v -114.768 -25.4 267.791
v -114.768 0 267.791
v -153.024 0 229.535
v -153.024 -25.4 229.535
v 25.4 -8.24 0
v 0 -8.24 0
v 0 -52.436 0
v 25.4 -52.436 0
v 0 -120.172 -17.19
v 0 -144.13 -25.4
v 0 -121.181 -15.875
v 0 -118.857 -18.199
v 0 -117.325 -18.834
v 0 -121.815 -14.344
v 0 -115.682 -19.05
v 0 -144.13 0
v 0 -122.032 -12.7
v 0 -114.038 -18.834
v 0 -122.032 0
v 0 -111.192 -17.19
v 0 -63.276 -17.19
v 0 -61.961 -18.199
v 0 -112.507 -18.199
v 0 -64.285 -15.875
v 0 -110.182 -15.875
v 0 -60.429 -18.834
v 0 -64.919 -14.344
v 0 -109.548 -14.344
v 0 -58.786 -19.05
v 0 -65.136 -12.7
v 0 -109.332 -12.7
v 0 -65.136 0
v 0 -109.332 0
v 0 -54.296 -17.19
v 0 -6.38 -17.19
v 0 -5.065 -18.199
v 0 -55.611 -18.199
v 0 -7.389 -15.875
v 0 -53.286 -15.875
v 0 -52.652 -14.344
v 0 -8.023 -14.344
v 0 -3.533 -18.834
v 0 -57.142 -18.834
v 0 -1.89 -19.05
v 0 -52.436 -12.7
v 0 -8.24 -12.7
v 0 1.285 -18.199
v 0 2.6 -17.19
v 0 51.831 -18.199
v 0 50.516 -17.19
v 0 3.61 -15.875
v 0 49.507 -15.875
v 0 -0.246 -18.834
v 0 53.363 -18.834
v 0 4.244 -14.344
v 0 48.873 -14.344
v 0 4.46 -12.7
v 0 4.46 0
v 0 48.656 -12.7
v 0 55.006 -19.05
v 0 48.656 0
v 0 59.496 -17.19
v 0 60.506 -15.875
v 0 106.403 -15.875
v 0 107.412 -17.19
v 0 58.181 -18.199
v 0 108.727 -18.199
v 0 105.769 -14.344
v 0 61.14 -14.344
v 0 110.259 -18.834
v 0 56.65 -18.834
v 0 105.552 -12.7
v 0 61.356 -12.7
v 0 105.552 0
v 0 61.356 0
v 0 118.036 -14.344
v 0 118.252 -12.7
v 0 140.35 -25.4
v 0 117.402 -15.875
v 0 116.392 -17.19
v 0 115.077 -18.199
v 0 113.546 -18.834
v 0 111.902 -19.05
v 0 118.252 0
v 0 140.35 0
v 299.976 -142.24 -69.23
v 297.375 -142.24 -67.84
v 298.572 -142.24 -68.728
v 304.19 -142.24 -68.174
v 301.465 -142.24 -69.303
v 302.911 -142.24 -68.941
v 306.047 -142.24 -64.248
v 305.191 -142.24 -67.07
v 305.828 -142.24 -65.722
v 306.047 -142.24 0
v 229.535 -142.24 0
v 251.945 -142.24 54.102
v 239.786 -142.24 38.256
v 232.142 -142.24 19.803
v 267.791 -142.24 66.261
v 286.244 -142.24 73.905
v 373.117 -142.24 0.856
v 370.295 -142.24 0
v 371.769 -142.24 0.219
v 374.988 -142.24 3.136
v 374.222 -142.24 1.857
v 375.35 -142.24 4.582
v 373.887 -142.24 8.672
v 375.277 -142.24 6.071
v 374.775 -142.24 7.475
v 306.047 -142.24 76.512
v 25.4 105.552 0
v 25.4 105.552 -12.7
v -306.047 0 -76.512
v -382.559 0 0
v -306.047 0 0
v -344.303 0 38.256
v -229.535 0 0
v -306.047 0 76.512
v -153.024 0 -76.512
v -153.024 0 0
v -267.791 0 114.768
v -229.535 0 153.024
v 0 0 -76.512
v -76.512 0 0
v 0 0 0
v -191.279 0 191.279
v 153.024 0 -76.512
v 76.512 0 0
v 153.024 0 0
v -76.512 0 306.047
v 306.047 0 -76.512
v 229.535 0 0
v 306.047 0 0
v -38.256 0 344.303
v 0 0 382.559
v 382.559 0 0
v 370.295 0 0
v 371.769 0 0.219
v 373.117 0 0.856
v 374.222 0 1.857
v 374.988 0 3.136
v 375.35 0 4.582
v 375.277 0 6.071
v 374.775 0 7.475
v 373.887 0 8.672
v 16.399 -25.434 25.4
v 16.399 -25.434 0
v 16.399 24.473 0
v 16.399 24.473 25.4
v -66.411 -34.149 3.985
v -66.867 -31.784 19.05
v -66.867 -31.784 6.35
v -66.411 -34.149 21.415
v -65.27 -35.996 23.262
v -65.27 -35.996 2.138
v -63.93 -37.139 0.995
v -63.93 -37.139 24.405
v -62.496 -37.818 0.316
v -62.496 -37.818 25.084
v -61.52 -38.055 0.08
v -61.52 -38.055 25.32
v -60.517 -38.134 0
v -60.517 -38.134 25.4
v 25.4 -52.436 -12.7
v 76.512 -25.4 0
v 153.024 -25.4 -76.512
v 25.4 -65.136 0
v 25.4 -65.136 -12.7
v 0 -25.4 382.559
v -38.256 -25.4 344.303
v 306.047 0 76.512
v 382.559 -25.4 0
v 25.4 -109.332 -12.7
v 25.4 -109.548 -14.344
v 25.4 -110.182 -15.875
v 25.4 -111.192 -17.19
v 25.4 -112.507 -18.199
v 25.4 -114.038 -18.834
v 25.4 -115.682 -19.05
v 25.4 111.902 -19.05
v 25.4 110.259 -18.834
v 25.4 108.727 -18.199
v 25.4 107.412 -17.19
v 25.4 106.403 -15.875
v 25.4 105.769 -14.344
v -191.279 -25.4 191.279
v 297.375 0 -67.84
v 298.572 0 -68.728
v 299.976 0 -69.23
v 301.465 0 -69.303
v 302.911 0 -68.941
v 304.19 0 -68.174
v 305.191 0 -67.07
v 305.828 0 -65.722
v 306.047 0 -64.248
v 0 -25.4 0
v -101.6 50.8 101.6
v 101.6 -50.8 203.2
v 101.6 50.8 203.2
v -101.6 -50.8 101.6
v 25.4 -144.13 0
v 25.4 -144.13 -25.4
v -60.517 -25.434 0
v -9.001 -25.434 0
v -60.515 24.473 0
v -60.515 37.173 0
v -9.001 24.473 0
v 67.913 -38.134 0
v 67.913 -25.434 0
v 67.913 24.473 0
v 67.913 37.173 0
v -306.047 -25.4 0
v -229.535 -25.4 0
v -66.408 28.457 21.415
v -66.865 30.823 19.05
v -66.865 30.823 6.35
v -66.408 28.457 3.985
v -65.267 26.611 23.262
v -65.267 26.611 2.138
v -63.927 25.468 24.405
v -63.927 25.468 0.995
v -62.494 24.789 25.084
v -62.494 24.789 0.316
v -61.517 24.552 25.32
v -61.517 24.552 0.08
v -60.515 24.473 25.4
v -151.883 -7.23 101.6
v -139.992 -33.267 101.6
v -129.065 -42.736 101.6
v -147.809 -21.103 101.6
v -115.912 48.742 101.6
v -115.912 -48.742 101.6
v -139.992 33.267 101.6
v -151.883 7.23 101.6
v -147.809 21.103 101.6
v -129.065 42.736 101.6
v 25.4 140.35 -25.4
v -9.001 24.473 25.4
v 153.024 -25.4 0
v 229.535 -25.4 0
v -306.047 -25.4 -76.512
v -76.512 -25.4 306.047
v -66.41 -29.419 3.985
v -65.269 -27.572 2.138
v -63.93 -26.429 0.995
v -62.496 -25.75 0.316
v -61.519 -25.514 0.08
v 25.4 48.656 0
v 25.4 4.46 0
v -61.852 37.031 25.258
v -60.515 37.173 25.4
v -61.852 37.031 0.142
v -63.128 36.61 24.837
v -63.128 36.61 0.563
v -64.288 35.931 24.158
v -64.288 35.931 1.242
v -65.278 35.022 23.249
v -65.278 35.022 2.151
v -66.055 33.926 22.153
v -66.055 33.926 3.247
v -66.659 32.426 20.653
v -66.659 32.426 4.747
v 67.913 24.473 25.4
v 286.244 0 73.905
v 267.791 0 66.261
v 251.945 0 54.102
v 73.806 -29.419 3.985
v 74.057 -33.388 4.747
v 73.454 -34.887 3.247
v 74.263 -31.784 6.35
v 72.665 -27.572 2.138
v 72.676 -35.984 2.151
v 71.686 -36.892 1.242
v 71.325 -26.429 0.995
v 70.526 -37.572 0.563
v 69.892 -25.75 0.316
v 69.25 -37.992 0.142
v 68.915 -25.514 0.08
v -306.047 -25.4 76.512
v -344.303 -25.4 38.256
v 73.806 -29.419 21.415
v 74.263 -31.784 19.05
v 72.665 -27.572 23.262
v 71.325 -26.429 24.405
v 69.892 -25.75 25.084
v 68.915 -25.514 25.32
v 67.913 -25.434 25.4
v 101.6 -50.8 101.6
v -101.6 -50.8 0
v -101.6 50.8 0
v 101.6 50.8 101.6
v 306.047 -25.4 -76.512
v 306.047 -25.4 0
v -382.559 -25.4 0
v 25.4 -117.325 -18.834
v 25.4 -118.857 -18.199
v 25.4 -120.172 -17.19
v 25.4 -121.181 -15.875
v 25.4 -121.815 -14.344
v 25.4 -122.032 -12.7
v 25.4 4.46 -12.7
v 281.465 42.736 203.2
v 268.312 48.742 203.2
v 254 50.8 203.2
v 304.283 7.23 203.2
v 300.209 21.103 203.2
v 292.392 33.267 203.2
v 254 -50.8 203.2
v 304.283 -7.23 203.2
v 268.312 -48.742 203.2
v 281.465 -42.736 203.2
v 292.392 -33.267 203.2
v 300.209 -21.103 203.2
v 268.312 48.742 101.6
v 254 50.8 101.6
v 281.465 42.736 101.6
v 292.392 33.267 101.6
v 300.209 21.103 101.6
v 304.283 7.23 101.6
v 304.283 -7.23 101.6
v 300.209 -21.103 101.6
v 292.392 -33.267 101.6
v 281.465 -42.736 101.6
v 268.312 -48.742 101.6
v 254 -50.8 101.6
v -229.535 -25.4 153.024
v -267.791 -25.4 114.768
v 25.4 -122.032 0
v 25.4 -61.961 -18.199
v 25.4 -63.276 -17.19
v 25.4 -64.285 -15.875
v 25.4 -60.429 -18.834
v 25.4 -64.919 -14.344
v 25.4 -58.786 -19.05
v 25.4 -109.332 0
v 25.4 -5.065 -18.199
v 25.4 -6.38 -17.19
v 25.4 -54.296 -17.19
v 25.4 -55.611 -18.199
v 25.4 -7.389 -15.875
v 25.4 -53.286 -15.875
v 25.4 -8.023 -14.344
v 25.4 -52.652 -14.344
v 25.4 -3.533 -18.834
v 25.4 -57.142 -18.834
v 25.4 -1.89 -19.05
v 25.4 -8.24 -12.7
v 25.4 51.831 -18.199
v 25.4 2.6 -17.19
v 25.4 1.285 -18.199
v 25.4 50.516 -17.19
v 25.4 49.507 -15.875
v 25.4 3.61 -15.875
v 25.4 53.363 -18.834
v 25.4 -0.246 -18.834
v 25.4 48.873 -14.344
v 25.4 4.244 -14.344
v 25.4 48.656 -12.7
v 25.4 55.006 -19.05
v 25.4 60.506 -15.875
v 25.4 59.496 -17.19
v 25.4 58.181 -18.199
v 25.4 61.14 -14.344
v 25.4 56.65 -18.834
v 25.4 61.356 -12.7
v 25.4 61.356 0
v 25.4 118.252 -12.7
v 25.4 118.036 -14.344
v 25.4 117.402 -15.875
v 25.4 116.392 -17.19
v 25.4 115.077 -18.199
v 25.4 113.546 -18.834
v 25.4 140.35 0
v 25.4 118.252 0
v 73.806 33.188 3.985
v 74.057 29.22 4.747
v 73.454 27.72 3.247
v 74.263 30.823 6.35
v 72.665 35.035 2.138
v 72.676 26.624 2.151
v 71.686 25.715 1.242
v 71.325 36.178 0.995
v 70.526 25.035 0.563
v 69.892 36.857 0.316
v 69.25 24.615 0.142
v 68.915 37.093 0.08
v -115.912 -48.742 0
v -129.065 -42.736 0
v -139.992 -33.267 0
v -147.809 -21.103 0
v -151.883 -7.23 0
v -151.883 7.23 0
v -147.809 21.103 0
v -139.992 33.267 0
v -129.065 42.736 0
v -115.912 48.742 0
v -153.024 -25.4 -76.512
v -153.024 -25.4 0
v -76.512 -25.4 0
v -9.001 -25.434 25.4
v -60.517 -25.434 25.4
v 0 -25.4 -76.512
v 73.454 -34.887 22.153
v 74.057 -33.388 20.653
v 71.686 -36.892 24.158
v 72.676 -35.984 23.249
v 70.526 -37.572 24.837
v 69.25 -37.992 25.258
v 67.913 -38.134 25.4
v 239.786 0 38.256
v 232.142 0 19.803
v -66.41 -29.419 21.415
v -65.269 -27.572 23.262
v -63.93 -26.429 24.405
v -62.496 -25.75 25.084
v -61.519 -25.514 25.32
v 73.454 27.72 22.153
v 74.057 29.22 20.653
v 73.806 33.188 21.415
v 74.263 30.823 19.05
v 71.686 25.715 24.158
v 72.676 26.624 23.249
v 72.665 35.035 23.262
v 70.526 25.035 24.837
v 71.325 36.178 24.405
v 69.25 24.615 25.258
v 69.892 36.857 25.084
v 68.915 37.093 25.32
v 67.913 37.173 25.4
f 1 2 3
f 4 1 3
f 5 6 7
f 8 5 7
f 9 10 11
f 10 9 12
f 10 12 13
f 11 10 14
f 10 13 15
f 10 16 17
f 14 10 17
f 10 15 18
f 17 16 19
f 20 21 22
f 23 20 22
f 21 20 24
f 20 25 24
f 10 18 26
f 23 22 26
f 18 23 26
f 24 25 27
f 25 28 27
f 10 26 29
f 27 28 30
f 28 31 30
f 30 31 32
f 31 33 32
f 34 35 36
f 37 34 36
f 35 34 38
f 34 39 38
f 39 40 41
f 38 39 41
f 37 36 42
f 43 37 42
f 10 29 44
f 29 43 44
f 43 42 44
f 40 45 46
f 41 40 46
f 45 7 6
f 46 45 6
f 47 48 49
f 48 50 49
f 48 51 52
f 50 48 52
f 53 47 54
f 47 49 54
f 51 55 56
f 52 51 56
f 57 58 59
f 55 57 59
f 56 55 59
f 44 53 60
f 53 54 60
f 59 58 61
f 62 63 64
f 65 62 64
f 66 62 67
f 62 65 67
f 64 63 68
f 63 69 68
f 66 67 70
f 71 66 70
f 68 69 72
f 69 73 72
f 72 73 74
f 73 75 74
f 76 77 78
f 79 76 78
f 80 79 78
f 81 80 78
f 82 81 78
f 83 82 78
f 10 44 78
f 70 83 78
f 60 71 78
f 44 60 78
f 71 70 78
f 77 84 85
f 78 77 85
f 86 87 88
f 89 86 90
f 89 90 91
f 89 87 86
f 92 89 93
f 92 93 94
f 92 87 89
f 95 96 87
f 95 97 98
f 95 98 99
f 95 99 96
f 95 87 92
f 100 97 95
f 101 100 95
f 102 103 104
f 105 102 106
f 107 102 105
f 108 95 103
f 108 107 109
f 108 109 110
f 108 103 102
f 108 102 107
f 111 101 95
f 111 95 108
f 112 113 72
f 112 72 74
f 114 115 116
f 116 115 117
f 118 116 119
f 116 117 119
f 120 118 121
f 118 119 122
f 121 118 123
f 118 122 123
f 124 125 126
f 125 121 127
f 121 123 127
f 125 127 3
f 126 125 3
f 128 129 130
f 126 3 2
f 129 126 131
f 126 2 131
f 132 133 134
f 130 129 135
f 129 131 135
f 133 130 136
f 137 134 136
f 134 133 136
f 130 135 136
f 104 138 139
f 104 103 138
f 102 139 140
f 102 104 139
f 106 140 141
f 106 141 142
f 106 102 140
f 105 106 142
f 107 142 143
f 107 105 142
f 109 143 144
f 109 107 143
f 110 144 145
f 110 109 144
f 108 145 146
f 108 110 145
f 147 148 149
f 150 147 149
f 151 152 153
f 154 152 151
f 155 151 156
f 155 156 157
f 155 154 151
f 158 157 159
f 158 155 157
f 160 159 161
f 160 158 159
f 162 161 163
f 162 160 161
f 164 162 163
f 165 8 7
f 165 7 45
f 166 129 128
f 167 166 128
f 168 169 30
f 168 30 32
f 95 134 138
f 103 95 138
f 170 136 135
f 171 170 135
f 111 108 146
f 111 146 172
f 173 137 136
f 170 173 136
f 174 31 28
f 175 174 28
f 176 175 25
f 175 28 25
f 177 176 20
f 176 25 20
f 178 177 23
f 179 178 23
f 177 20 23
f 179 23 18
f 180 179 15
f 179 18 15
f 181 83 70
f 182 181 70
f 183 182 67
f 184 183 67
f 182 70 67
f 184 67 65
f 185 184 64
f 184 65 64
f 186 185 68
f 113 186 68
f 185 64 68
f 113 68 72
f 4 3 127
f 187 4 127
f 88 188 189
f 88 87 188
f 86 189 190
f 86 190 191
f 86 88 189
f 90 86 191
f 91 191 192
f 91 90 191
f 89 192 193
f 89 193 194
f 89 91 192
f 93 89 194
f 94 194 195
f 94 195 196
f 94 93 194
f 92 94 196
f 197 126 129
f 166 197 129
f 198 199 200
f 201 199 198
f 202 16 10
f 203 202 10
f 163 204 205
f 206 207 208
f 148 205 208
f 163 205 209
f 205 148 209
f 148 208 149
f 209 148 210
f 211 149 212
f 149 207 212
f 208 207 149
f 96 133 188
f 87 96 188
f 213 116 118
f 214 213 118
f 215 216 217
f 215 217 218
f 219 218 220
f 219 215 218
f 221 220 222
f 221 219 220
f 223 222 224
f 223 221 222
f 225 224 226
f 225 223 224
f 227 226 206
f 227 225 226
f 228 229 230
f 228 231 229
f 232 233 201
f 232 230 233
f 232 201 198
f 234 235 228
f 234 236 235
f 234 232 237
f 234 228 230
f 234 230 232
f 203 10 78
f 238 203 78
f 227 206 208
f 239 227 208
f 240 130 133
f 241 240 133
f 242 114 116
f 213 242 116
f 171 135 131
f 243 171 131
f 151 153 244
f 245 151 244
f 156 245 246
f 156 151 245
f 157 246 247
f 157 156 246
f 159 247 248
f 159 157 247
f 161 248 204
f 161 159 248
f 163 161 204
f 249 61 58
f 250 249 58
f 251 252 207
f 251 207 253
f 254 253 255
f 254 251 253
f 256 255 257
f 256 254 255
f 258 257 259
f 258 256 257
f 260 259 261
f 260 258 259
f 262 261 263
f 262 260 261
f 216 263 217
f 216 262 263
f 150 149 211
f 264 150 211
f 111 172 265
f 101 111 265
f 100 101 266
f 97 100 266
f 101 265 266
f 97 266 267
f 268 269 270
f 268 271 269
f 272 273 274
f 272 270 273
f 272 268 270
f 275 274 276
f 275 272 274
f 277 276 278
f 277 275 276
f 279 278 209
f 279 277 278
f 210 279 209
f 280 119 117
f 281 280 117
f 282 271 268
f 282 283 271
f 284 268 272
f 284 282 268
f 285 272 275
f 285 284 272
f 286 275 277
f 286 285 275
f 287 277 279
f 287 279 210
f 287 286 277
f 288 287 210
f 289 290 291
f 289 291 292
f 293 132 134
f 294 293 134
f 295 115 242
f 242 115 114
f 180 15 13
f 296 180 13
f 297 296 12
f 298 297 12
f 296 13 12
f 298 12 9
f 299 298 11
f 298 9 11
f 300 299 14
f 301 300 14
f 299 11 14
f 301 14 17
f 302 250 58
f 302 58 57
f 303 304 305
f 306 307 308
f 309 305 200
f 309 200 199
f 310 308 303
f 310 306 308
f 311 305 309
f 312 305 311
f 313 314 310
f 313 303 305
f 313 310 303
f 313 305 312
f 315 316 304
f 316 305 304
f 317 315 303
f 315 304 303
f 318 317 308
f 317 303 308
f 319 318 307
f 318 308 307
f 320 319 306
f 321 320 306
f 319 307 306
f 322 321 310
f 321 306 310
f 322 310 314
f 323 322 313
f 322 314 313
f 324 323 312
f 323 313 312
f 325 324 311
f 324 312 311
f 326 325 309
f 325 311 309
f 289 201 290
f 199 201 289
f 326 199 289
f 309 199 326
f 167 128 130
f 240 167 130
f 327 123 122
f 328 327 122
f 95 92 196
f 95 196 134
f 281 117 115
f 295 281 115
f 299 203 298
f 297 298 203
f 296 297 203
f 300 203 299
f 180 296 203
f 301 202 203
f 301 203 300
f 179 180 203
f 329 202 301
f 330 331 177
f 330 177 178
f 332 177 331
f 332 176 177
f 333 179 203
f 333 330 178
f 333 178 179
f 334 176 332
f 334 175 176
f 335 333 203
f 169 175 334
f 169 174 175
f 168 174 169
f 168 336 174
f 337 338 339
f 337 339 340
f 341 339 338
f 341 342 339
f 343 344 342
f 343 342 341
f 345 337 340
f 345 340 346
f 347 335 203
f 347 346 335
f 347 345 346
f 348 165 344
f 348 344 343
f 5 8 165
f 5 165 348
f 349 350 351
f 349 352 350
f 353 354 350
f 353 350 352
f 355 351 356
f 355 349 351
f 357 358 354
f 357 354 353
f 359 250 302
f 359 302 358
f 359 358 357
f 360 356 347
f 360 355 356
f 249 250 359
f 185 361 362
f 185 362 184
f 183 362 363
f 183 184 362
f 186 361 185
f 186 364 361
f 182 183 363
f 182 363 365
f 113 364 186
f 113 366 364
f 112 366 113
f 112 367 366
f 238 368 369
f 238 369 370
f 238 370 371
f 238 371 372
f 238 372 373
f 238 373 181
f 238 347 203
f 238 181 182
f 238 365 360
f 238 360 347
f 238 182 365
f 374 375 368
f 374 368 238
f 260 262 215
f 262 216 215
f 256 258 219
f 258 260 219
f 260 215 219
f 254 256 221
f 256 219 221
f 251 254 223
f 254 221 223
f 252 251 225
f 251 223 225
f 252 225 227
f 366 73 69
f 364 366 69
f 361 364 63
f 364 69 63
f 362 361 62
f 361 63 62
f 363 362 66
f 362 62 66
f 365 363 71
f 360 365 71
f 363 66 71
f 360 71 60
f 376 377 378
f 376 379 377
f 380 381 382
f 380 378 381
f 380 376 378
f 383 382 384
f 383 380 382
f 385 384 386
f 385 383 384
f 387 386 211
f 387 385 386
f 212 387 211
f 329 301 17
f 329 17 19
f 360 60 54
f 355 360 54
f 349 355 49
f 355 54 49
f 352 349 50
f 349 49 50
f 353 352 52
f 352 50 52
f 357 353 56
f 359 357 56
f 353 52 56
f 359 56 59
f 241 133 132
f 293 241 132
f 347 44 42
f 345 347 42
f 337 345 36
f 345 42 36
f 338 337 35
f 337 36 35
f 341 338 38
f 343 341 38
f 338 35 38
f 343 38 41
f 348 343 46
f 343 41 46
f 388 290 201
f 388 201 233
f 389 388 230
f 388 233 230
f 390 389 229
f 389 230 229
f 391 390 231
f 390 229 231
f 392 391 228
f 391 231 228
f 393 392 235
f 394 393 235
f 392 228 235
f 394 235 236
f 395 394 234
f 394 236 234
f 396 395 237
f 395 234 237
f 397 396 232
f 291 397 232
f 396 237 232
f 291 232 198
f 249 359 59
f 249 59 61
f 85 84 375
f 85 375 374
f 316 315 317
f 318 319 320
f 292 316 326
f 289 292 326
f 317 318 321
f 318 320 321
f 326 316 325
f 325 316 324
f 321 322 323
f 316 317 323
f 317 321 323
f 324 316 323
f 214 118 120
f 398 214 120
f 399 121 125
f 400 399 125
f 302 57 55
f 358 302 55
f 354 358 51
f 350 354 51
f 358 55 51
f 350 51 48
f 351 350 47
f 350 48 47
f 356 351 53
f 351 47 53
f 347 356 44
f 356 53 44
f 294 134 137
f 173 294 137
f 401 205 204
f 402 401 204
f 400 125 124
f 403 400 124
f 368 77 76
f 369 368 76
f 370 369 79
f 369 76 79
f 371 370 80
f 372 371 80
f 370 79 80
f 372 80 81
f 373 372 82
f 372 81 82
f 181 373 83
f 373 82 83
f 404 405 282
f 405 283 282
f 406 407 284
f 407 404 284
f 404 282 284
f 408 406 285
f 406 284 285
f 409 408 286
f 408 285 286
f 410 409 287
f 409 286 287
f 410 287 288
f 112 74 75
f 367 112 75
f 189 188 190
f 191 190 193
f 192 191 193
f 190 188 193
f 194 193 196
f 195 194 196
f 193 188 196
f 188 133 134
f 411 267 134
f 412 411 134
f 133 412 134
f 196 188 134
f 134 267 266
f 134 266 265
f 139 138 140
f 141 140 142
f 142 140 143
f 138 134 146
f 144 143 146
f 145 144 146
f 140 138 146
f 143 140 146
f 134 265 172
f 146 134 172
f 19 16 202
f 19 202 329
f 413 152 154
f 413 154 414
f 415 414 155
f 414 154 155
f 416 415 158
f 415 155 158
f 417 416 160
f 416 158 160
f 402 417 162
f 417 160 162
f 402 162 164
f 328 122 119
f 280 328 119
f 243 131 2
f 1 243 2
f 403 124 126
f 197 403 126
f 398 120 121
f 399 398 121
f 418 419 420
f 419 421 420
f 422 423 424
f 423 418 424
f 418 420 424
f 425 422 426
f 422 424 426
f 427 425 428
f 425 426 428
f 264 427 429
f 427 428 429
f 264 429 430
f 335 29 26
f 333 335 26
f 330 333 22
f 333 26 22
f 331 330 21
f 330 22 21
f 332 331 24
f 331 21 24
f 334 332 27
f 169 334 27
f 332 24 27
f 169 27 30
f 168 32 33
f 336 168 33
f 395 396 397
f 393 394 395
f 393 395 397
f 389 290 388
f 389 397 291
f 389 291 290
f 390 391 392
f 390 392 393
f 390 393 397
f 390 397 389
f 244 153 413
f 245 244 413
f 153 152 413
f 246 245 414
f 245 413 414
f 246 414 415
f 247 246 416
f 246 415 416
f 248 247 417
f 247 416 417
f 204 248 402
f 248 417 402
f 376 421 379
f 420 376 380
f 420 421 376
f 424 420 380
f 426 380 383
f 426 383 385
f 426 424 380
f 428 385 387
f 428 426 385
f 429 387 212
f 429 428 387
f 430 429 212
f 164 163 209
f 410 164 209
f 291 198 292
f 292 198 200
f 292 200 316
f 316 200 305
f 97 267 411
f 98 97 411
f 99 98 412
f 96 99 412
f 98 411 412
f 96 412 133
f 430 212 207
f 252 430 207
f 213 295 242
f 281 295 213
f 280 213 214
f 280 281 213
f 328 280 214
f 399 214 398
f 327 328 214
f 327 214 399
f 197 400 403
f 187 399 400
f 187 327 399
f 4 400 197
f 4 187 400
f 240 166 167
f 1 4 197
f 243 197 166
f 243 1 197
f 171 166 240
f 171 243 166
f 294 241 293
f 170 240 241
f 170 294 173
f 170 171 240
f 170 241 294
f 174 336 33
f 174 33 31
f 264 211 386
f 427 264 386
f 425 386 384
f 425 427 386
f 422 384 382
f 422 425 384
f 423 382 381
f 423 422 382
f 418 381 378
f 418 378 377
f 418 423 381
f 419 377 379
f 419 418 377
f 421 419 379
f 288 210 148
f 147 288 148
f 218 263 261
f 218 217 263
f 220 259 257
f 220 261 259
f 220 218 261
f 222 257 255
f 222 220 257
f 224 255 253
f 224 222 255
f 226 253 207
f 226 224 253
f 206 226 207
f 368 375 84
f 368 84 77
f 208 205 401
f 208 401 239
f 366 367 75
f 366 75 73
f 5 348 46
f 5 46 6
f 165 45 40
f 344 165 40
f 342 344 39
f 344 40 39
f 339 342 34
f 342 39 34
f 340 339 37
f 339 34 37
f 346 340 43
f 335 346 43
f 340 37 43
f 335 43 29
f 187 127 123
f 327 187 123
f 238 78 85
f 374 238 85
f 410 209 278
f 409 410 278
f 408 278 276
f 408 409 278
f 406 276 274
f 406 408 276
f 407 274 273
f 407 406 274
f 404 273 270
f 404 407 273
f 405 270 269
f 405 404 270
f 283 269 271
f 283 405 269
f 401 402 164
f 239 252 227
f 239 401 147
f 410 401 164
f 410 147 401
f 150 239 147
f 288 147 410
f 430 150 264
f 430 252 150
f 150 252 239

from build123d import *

# Parameters (mm, degrees)
F0_W          = 101.6
F0_H          = 50.8
F0_W_2        = 50.8
F0_H_2        = 101.6
F1_DEPTH      = 50.8
F2_ANGLE_BACK = 90
F2_ANGLE      = 180
F3_DEPTH      = 2.286
F0_W_3        = 43.6525400519
F4_ANGLE_BACK = 90
F4_ANGLE      = 180
F5_W          = 22.098
F5_H          = 6.35
F6_DEPTH      = 25.4
F7_W          = 57.8641055384
F7_H          = 12.7
F7_W_2        = 12.7
F7_H_2        = 49.9071290871
F8_DEPTH      = 25.4
F9_R          = 6.34999
F11_DEPTH     = 25.4
F12_DEPTH     = 142.24
F13_R         = 5.08


# Not quite as in the source:
# - a fillet or chamfer is up to 0.001 mm smaller than in the source, because OpenCascade refuses the exact size


with BuildPart() as f1:
    # F0 (on Front) → F1 (new body, symmetric)
    with BuildSketch(Plane.XZ):
        Polygon((101.6, 203.2), (0, 152.4), (101.6, 152.4), align=None)
        with Locations((50.8, 127)):
            Rectangle(F0_W, F0_H)
        Polygon((0, 152.4), (-101.6, 101.6), (0, 101.6), align=None)
        with Locations((-50.8, 76.2)):
            Rectangle(F0_W, F0_H)
        Polygon((0, 101.6), (0, 50.8), (101.6, 101.6), align=None)
        Polygon((-101.6, 50.8), (-101.6, 0), (0, 50.8), align=None)
        Polygon((101.6, 152.4), (101.6, 101.6), (152.4, 101.6), (152.4, 203.2), (101.6, 203.2), align=None)
        with Locations((177.8, 152.4)):
            Rectangle(F0_W_2, F0_H_2)
        with Locations((228.6, 152.4)):
            Rectangle(F0_W_2, F0_H_2)
    extrude(amount=F1_DEPTH, both=True)

    # F0 (on Front) → F2 (revolve)
    with BuildSketch(Plane.XZ, mode=Mode.PRIVATE) as f2_sk:
        with Locations((279.4, 152.4)):
            Rectangle(F0_W_2, F0_H_2)
    revolve(f2_sk.sketch.rotate(Axis((254, 0, 152.4), (0, 0, -1)), -F2_ANGLE_BACK), axis=Axis((254, 0, 152.4), (0, 0, -1)), revolution_arc=F2_ANGLE)

    # F0 (on Front) → F4 (revolve)
    with BuildSketch(Plane.XZ, mode=Mode.PRIVATE) as f4_sk:
        with Locations((-130.573729974, 50.8)):
            Rectangle(F0_W_3, F0_H_2)
        Polygon((-108.7474599481, 0), (-101.6, 0), (-101.6, 50.8), (-101.6, 101.6), (-108.7474599481, 101.6), align=None)
    revolve(f4_sk.sketch.rotate(Axis((-101.6, 0, 50.8), (0, 0, -1)), -F4_ANGLE_BACK), axis=Axis((-101.6, 0, 50.8), (0, 0, -1)), revolution_arc=F4_ANGLE)


with BuildPart() as f3:
    # F0 (on Front) → F3 (new body)
    with BuildSketch(Plane.XZ):
        Polygon((-108.7474599481, 0), (-101.6, 0), (-101.6, 50.8), (-101.6, 101.6), (-108.7474599481, 101.6), align=None)
    extrude(amount=F3_DEPTH)

    # F10 (on Front) → F11 (join)
    with BuildSketch(Plane.XZ):
        Polygon((-344.3030196818, 38.2558910758), (-382.5589107575, 0), (-306.047128606, 0), align=None)
        Polygon((-306.047128606, 0), (-382.5589107575, 0), (-306.047128606, -76.5117821515), align=None)
        Polygon((-344.3030196818, 38.2558910758), (-306.047128606, 0), (-229.5353464545, 0), (-306.047128606, 76.5117821515), align=None)
        with BuildLine():
            ThreePointArc((-229.5353464545, 0), (-251.945128606, 54.102), (-306.047128606, 76.5117821515))
            Line((-306.047128606, 76.5117821515), (-229.5353464545, 0))
        make_face()
        with BuildLine():
            Line((-267.7912375303, 114.7676732273), (-306.047128606, 76.5117821515))
            ThreePointArc((-306.047128606, 76.5117821515), (-251.945128606, 54.102), (-229.5353464545, 0))
            ThreePointArc((-229.5353464545, 0), (-223.7112338288, 29.2797914101), (-207.125564303, 54.102))
            Line((-207.125564303, 54.102), (-267.7912375303, 114.7676732273))
        make_face()
        with BuildLine():
            ThreePointArc((-207.125564303, 54.102), (-223.7112338288, 29.2797914101), (-229.5353464545, 0))
            Line((-229.5353464545, 0), (-153.023564303, 0))
            Line((-153.023564303, 0), (-207.125564303, 54.102))
        make_face()
        Polygon((-153.023564303, 0), (-229.5353464545, 0), (-153.023564303, -76.5117821515), align=None)
        with BuildLine():
            Line((-229.5353464545, 153.023564303), (-267.7912375303, 114.7676732273))
            Line((-267.7912375303, 114.7676732273), (-207.125564303, 54.102))
            ThreePointArc((-207.125564303, 54.102), (-182.3033557131, 70.6876695257), (-153.023564303, 76.5117821515))
            Line((-153.023564303, 76.5117821515), (-229.5353464545, 153.023564303))
        make_face()
        with BuildLine():
            Line((-207.125564303, 54.102), (-153.023564303, 0))
            Line((-153.023564303, 0), (-76.5117821515, 0))
            Line((-76.5117821515, 0), (-153.023564303, 76.5117821515))
            ThreePointArc((-153.023564303, 76.5117821515), (-182.3033557131, 70.6876695257), (-207.125564303, 54.102))
        make_face()
        with BuildLine():
            Line((-191.2794553788, 191.2794553788), (-229.5353464545, 153.023564303))
            Line((-229.5353464545, 153.023564303), (-153.023564303, 76.5117821515))
            ThreePointArc((-153.023564303, 76.5117821515), (-98.921564303, 54.102), (-76.5117821515, 0))
            ThreePointArc((-76.5117821515, 0), (-70.6876695257, 29.2797914101), (-54.102, 54.102))
            Line((-54.102, 54.102), (-191.2794553788, 191.2794553788))
        make_face()
        Polygon((-38.2558910758, 38.2558910758), (-76.5117821515, 0), (0, 0), align=None)
        Polygon((0, 0), (-76.5117821515, 0), (0, -76.5117821515), align=None)
        with BuildLine():
            ThreePointArc((-54.102, 54.102), (-70.6876695257, 29.2797914101), (-76.5117821515, 0))
            Line((-76.5117821515, 0), (-38.2558910758, 38.2558910758))
            Line((-38.2558910758, 38.2558910758), (-54.102, 54.102))
        make_face()
        with BuildLine():
            Line((-153.023564303, 76.5117821515), (-76.5117821515, 0))
            ThreePointArc((-76.5117821515, 0), (-98.921564303, 54.102), (-153.023564303, 76.5117821515))
        make_face()
        with BuildLine():
            Line((-153.023564303, 229.5353464545), (-191.2794553788, 191.2794553788))
            Line((-191.2794553788, 191.2794553788), (-54.102, 54.102))
            ThreePointArc((-54.102, 54.102), (-29.2797914101, 70.6876695257), (0, 76.5117821515))
            Line((0, 76.5117821515), (-153.023564303, 229.5353464545))
        make_face()
        Polygon((-38.2558910758, 38.2558910758), (0, 0), (76.5117821515, 0), (0, 76.5117821515), align=None)
        with BuildLine():
            Line((-54.102, 54.102), (-38.2558910758, 38.2558910758))
            Line((-38.2558910758, 38.2558910758), (0, 76.5117821515))
            ThreePointArc((0, 76.5117821515), (-29.2797914101, 70.6876695257), (-54.102, 54.102))
        make_face()
        Polygon((-114.7676732273, 267.7912375303), (-153.023564303, 229.5353464545), (0, 76.5117821515), (38.2558910758, 114.7676732273), align=None)
        Polygon((114.7676732273, 38.2558910758), (76.5117821515, 0), (153.023564303, 0), align=None)
        Polygon((153.023564303, 0), (76.5117821515, 0), (153.023564303, -76.5117821515), align=None)
        with BuildLine():
            ThreePointArc((98.921564303, 54.102), (82.3358947773, 29.2797914101), (76.5117821515, 0))
            Line((76.5117821515, 0), (114.7676732273, 38.2558910758))
            Line((114.7676732273, 38.2558910758), (98.921564303, 54.102))
        make_face()
        with BuildLine():
            ThreePointArc((0, 76.5117821515), (54.102, 54.102), (76.5117821515, 0))
            ThreePointArc((76.5117821515, 0), (82.3358947773, 29.2797914101), (98.921564303, 54.102))
            Line((98.921564303, 54.102), (38.2558910758, 114.7676732273))
            Line((38.2558910758, 114.7676732273), (0, 76.5117821515))
        make_face()
        with BuildLine():
            Line((0, 76.5117821515), (76.5117821515, 0))
            ThreePointArc((76.5117821515, 0), (54.102, 54.102), (0, 76.5117821515))
        make_face()
        Polygon((-76.5117821515, 306.047128606), (-114.7676732273, 267.7912375303), (38.2558910758, 114.7676732273), (76.5117821515, 153.023564303), align=None)
        Polygon((114.7676732273, 38.2558910758), (153.023564303, 0), (229.5353464545, 0), (153.023564303, 76.5117821515), align=None)
        with BuildLine():
            Line((98.921564303, 54.102), (114.7676732273, 38.2558910758))
            Line((114.7676732273, 38.2558910758), (153.023564303, 76.5117821515))
            ThreePointArc((153.023564303, 76.5117821515), (123.7437728929, 70.6876695257), (98.921564303, 54.102))
        make_face()
        with BuildLine():
            Line((38.2558910758, 114.7676732273), (98.921564303, 54.102))
            ThreePointArc((98.921564303, 54.102), (123.7437728929, 70.6876695257), (153.023564303, 76.5117821515))
            Line((153.023564303, 76.5117821515), (76.5117821515, 153.023564303))
            Line((76.5117821515, 153.023564303), (38.2558910758, 114.7676732273))
        make_face()
        Polygon((-38.2558910758, 344.3030196818), (-76.5117821515, 306.047128606), (76.5117821515, 153.023564303), (114.7676732273, 191.2794553788), align=None)
        with BuildLine():
            ThreePointArc((251.945128606, 54.102), (235.3594590803, 29.2797914101), (229.5353464545, 0))
            Line((229.5353464545, 0), (306.047128606, 0))
            Line((306.047128606, 0), (251.945128606, 54.102))
        make_face()
        Polygon((306.047128606, 0), (229.5353464545, 0), (306.047128606, -76.5117821515), align=None)
        with BuildLine():
            ThreePointArc((153.023564303, 76.5117821515), (207.125564303, 54.102), (229.5353464545, 0))
            ThreePointArc((229.5353464545, 0), (235.3594590803, 29.2797914101), (251.945128606, 54.102))
            Line((251.945128606, 54.102), (191.2794553788, 114.7676732273))
            Line((191.2794553788, 114.7676732273), (153.023564303, 76.5117821515))
        make_face()
        with BuildLine():
            Line((153.023564303, 76.5117821515), (229.5353464545, 0))
            ThreePointArc((229.5353464545, 0), (207.125564303, 54.102), (153.023564303, 76.5117821515))
        make_face()
        Polygon((153.023564303, 153.023564303), (153.023564303, 76.5117821515), (191.2794553788, 114.7676732273), align=None)
        Polygon((76.5117821515, 153.023564303), (153.023564303, 76.5117821515), (153.023564303, 153.023564303), align=None)
        Polygon((114.7676732273, 191.2794553788), (76.5117821515, 153.023564303), (153.023564303, 153.023564303), align=None)
        Polygon((0, 382.5589107575), (-38.2558910758, 344.3030196818), (114.7676732273, 191.2794553788), (153.023564303, 229.5353464545), align=None)
        with BuildLine():
            Line((251.945128606, 54.102), (306.047128606, 0))
            Line((306.047128606, 0), (382.5589107575, 0))
            Line((382.5589107575, 0), (306.047128606, 76.5117821515))
            ThreePointArc((306.047128606, 76.5117821515), (276.7673371959, 70.6876695257), (251.945128606, 54.102))
        make_face()
        with BuildLine():
            Line((191.2794553788, 114.7676732273), (251.945128606, 54.102))
            ThreePointArc((251.945128606, 54.102), (276.7673371959, 70.6876695257), (306.047128606, 76.5117821515))
            Line((306.047128606, 76.5117821515), (229.5353464545, 153.023564303))
            Line((229.5353464545, 153.023564303), (191.2794553788, 114.7676732273))
        make_face()
        Polygon((153.023564303, 153.023564303), (191.2794553788, 114.7676732273), (229.5353464545, 153.023564303), align=None)
        Polygon((114.7676732273, 191.2794553788), (153.023564303, 153.023564303), (153.023564303, 229.5353464545), align=None)
        Polygon((153.023564303, 229.5353464545), (153.023564303, 153.023564303), (229.5353464545, 153.023564303), align=None)
    extrude(amount=F11_DEPTH)


with BuildPart() as f6:
    # F5 (on Right) → F6 (new body)
    with BuildSketch(Plane.YZ):
        with Locations((-133.0807154845, -3.175)):
            Rectangle(F5_W, F5_H)
        with Locations((129.3012845155, -3.175)):
            Rectangle(F5_W, F5_H)
        with Locations((-76.1847154845, -3.175)):
            Rectangle(F5_W, F5_H)
        with Locations((-41.3867154845, -3.175)):
            Rectangle(F5_W, F5_H)
        with Locations((-19.2887154845, -3.175)):
            Rectangle(F5_W, F5_H)
        with Locations((15.5092845155, -3.175)):
            Rectangle(F5_W, F5_H)
        with Locations((37.6072845155, -3.175)):
            Rectangle(F5_W, F5_H)
        with Locations((72.4052845155, -3.175)):
            Rectangle(F5_W, F5_H)
        with Locations((94.5032845155, -3.175)):
            Rectangle(F5_W, F5_H)
        with BuildLine():
            Line((-122.0317154845, -12.7), (-144.1297154845, -12.7))
            Line((-144.1297154845, -12.7), (-144.1297154845, -25.4))
            Line((-144.1297154845, -25.4), (-115.6817154845, -25.4))
            Line((-115.6817154845, -25.4), (-115.6817154845, -19.05))
            ThreePointArc((-115.6817154845, -19.05), (-120.171843545, -17.1901280605), (-122.0317154845, -12.7))
        make_face()
        with BuildLine():
            Line((111.9022845155, -19.05), (111.9022845155, -25.4))
            Line((111.9022845155, -25.4), (140.3502845155, -25.4))
            Line((140.3502845155, -25.4), (140.3502845155, -12.7))
            Line((140.3502845155, -12.7), (118.2522845155, -12.7))
            ThreePointArc((118.2522845155, -12.7), (116.3924125761, -17.1901280605), (111.9022845155, -19.05))
        make_face()
        with Locations((-133.0807154845, -9.525)):
            Rectangle(F5_W, F5_H)
        with BuildLine():
            Line((-87.2337154845, -12.7), (-109.3317154845, -12.7))
            ThreePointArc((-109.3317154845, -12.7), (-111.1915874239, -17.1901280605), (-115.6817154845, -19.05))
            Line((-115.6817154845, -19.05), (-115.6817154845, -25.4))
            Line((-115.6817154845, -25.4), (-87.2337154845, -25.4))
            Line((-87.2337154845, -25.4), (-87.2337154845, -12.7))
        make_face()
        with BuildLine():
            Line((-65.1357154845, -12.7), (-87.2337154845, -12.7))
            Line((-87.2337154845, -12.7), (-87.2337154845, -25.4))
            Line((-87.2337154845, -25.4), (-58.7857154845, -25.4))
            Line((-58.7857154845, -25.4), (-58.7857154845, -19.05))
            ThreePointArc((-58.7857154845, -19.05), (-63.275843545, -17.1901280605), (-65.1357154845, -12.7))
        make_face()
        with BuildLine():
            Line((-58.7857154845, -19.05), (-58.7857154845, -25.4))
            Line((-58.7857154845, -25.4), (-30.3377154845, -25.4))
            Line((-30.3377154845, -25.4), (-30.3377154845, -12.7))
            Line((-30.3377154845, -12.7), (-52.4357154845, -12.7))
            ThreePointArc((-52.4357154845, -12.7), (-54.2955874239, -17.1901280605), (-58.7857154845, -19.05))
        make_face()
        with BuildLine():
            Line((-30.3377154845, -12.7), (-30.3377154845, -25.4))
            Line((-30.3377154845, -25.4), (-1.8897154845, -25.4))
            Line((-1.8897154845, -25.4), (-1.8897154845, -19.05))
            ThreePointArc((-1.8897154845, -19.05), (-6.379843545, -17.1901280605), (-8.2397154845, -12.7))
            Line((-8.2397154845, -12.7), (-30.3377154845, -12.7))
        make_face()
        with BuildLine():
            Line((-1.8897154845, -19.05), (-1.8897154845, -25.4))
            Line((-1.8897154845, -25.4), (26.5582845155, -25.4))
            Line((26.5582845155, -25.4), (26.5582845155, -12.7))
            Line((26.5582845155, -12.7), (4.4602845155, -12.7))
            ThreePointArc((4.4602845155, -12.7), (2.6004125761, -17.1901280605), (-1.8897154845, -19.05))
        make_face()
        with BuildLine():
            Line((26.5582845155, -12.7), (26.5582845155, -25.4))
            Line((26.5582845155, -25.4), (55.0062845155, -25.4))
            Line((55.0062845155, -25.4), (55.0062845155, -19.05))
            ThreePointArc((55.0062845155, -19.05), (50.516156455, -17.1901280605), (48.6562845155, -12.7))
            Line((48.6562845155, -12.7), (26.5582845155, -12.7))
        make_face()
        with BuildLine():
            Line((55.0062845155, -19.05), (55.0062845155, -25.4))
            Line((55.0062845155, -25.4), (83.4542845155, -25.4))
            Line((83.4542845155, -25.4), (83.4542845155, -12.7))
            Line((83.4542845155, -12.7), (61.3562845155, -12.7))
            ThreePointArc((61.3562845155, -12.7), (59.4964125761, -17.1901280605), (55.0062845155, -19.05))
        make_face()
        with BuildLine():
            Line((83.4542845155, -12.7), (83.4542845155, -25.4))
            Line((83.4542845155, -25.4), (111.9022845155, -25.4))
            Line((111.9022845155, -25.4), (111.9022845155, -19.05))
            ThreePointArc((111.9022845155, -19.05), (107.412156455, -17.1901280605), (105.5522845155, -12.7))
            Line((105.5522845155, -12.7), (83.4542845155, -12.7))
        make_face()
        with Locations((-98.2827154845, -9.525)):
            Rectangle(F5_W, F5_H)
        with Locations((-98.2827154845, -3.175)):
            Rectangle(F5_W, F5_H)
        with Locations((-76.1847154845, -9.525)):
            Rectangle(F5_W, F5_H)
        with Locations((-41.3867154845, -9.525)):
            Rectangle(F5_W, F5_H)
        with Locations((-19.2887154845, -9.525)):
            Rectangle(F5_W, F5_H)
        with Locations((15.5092845155, -9.525)):
            Rectangle(F5_W, F5_H)
        with Locations((37.6072845155, -9.525)):
            Rectangle(F5_W, F5_H)
        with Locations((72.4052845155, -9.525)):
            Rectangle(F5_W, F5_H)
        with Locations((94.5032845155, -9.525)):
            Rectangle(F5_W, F5_H)
        with Locations((129.3012845155, -9.525)):
            Rectangle(F5_W, F5_H)
    extrude(amount=F6_DEPTH)


with BuildPart() as f8:
    # F7 (on Top) → F8 (new body)
    with BuildSketch(Plane.XY):
        Polygon((-9.0009163551, -25.4342753371), (-66.8671883946, -25.4342753371), (-66.8677397098, -38.1342753371), (-9.0009163551, -38.1342753371), align=None)
        with Locations((45.3311364141, -31.7842753371)):
            Rectangle(F7_W, F7_H)
        Polygon((3.6990836449, 37.1728537501), (-66.8650218935, 37.1728537501), (-66.8650218935, 24.4728537501), (-9.0009163551, 24.4728537501), (3.6990836449, 24.4728537501), align=None)
        Polygon((74.2631891833, 37.1728537501), (3.6990836449, 37.1728537501), (3.6990836449, 24.4728537501), (16.3990836449, 24.4728537501), (74.2631891833, 24.4728537501), align=None)
        with Locations((10.0490836449, -31.7842753371)):
            Rectangle(F7_W_2, F7_H)
        with Locations((-2.6509163551, -31.7842753371)):
            Rectangle(F7_W_2, F7_H)
        with Locations((-2.6509163551, -0.4807107935)):
            Rectangle(F7_W_2, F7_H_2)
        with Locations((10.0490836449, -0.4807107935)):
            Rectangle(F7_W_2, F7_H_2)
    extrude(amount=F8_DEPTH)

    # F9 (radius 6.35 in the source; OpenCascade refuses exactly that, so slightly less here)
    f9_edges = [f8.edges().sort_by_distance(p)[0] for p in [
        (-66.867188, -25.434275, 12.7),
        (-66.86774, -38.134275, 12.7),
        (-66.867464, -31.784275, 0),
        (-66.867464, -31.784275, 25.4),
        (-66.865022, 37.172854, 12.7),
        (-66.865022, 24.472854, 12.7),
        (-66.865022, 30.822854, 0),
        (-66.865022, 30.822854, 25.4),
        (74.263189, -38.134275, 12.7),
        (74.263189, -25.434275, 12.7),
        (74.263189, -31.784275, 0),
        (74.263189, -31.784275, 25.4),
        (74.263189, 24.472854, 12.7),
        (74.263189, 37.172854, 12.7),
        (74.263189, 30.822854, 0),
        (74.263189, 30.822854, 25.4),
    ]]
    fillet(f9_edges, radius=F9_R)


with BuildPart() as f12:
    # F10 (on Front) → F12 (new body)
    with BuildSketch(Plane.XZ):
        with BuildLine():
            ThreePointArc((251.945128606, 54.102), (235.3594590803, 29.2797914101), (229.5353464545, 0))
            Line((229.5353464545, 0), (306.047128606, 0))
            Line((306.047128606, 0), (251.945128606, 54.102))
        make_face()
        Polygon((306.047128606, 0), (229.5353464545, 0), (306.047128606, -76.5117821515), align=None)
        with BuildLine():
            Line((251.945128606, 54.102), (306.047128606, 0))
            Line((306.047128606, 0), (382.5589107575, 0))
            Line((382.5589107575, 0), (306.047128606, 76.5117821515))
            ThreePointArc((306.047128606, 76.5117821515), (276.7673371959, 70.6876695257), (251.945128606, 54.102))
        make_face()
    extrude(amount=F12_DEPTH)

    # F13
    f13_edges = [f12.edges().sort_by_distance(p)[0] for p in [
        (382.558911, -71.12, 0),
        (306.047129, -71.12, -76.511782),
    ]]
    fillet(f13_edges, radius=F13_R)


solid = Compound([f1.part, f3.part, f6.part, f8.part, f12.part])
